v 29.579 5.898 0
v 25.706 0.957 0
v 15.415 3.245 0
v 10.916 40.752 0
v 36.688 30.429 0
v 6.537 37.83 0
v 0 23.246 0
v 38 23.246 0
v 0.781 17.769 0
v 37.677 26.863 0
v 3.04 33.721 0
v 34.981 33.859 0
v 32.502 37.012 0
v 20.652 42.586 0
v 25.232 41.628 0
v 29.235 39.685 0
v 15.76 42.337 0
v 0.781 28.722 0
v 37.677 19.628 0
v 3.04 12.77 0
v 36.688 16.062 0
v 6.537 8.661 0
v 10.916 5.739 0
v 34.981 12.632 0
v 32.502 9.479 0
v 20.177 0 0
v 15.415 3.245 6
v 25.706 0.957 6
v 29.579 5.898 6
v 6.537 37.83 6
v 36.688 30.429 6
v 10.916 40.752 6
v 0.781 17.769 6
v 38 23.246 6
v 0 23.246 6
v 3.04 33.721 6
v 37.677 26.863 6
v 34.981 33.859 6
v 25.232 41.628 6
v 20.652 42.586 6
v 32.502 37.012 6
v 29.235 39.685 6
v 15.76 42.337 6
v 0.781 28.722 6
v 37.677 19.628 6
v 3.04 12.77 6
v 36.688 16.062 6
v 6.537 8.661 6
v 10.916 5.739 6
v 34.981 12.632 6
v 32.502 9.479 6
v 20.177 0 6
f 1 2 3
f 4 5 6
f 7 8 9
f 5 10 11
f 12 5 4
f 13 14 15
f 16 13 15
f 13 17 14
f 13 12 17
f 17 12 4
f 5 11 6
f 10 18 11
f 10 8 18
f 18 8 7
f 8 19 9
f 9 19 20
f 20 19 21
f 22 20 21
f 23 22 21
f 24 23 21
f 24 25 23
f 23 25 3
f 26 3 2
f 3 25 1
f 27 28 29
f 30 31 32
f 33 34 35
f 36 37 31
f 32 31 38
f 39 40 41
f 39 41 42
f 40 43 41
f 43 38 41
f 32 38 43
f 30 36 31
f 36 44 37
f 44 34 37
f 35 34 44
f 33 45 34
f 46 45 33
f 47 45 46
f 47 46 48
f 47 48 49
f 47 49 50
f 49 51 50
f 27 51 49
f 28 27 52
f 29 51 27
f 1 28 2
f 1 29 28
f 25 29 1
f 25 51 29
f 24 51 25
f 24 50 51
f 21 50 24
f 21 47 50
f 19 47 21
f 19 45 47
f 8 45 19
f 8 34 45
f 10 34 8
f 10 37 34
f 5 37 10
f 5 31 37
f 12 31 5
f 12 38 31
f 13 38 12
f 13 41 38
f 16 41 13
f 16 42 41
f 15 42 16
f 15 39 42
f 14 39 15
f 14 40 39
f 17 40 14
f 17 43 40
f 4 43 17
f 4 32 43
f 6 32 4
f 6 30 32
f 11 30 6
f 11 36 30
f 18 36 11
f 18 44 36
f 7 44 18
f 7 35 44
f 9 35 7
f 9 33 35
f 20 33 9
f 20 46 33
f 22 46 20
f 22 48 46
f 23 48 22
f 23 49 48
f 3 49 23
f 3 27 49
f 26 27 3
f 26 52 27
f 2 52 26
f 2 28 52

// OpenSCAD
$fn = 32;

// ----------------------------------------------------------------------
// Cam disc: base radius 15.0 mm, lift 8.0 mm, 26 profile points
// ----------------------------------------------------------------------

// --- parameters (mm) ---
profile_height = 6;       // extrusion height
profile_points = 26;      // points of the closed outline

profile = [[38, 23.246], [37.677, 26.863], [36.688, 30.429], [34.981, 33.859], [32.502, 37.012], [29.235, 39.685], [25.232, 41.628], [20.652, 42.586], [15.76, 42.337], [10.916, 40.752], [6.537, 37.83], [3.04, 33.721], [0.781, 28.722], [0, 23.246], [0.781, 17.769], [3.04, 12.77], [6.537, 8.661], [10.916, 5.739], [15.415, 3.245], [20.177, 0], [25.706, 0.957], [29.579, 5.898], [32.502, 9.479], [34.981, 12.632], [36.688, 16.062], [37.677, 19.628]];  // single closed polygon, 26 points, counter clockwise

// --- the one profile operation ---
linear_extrude(height = profile_height) polygon(points = profile);
